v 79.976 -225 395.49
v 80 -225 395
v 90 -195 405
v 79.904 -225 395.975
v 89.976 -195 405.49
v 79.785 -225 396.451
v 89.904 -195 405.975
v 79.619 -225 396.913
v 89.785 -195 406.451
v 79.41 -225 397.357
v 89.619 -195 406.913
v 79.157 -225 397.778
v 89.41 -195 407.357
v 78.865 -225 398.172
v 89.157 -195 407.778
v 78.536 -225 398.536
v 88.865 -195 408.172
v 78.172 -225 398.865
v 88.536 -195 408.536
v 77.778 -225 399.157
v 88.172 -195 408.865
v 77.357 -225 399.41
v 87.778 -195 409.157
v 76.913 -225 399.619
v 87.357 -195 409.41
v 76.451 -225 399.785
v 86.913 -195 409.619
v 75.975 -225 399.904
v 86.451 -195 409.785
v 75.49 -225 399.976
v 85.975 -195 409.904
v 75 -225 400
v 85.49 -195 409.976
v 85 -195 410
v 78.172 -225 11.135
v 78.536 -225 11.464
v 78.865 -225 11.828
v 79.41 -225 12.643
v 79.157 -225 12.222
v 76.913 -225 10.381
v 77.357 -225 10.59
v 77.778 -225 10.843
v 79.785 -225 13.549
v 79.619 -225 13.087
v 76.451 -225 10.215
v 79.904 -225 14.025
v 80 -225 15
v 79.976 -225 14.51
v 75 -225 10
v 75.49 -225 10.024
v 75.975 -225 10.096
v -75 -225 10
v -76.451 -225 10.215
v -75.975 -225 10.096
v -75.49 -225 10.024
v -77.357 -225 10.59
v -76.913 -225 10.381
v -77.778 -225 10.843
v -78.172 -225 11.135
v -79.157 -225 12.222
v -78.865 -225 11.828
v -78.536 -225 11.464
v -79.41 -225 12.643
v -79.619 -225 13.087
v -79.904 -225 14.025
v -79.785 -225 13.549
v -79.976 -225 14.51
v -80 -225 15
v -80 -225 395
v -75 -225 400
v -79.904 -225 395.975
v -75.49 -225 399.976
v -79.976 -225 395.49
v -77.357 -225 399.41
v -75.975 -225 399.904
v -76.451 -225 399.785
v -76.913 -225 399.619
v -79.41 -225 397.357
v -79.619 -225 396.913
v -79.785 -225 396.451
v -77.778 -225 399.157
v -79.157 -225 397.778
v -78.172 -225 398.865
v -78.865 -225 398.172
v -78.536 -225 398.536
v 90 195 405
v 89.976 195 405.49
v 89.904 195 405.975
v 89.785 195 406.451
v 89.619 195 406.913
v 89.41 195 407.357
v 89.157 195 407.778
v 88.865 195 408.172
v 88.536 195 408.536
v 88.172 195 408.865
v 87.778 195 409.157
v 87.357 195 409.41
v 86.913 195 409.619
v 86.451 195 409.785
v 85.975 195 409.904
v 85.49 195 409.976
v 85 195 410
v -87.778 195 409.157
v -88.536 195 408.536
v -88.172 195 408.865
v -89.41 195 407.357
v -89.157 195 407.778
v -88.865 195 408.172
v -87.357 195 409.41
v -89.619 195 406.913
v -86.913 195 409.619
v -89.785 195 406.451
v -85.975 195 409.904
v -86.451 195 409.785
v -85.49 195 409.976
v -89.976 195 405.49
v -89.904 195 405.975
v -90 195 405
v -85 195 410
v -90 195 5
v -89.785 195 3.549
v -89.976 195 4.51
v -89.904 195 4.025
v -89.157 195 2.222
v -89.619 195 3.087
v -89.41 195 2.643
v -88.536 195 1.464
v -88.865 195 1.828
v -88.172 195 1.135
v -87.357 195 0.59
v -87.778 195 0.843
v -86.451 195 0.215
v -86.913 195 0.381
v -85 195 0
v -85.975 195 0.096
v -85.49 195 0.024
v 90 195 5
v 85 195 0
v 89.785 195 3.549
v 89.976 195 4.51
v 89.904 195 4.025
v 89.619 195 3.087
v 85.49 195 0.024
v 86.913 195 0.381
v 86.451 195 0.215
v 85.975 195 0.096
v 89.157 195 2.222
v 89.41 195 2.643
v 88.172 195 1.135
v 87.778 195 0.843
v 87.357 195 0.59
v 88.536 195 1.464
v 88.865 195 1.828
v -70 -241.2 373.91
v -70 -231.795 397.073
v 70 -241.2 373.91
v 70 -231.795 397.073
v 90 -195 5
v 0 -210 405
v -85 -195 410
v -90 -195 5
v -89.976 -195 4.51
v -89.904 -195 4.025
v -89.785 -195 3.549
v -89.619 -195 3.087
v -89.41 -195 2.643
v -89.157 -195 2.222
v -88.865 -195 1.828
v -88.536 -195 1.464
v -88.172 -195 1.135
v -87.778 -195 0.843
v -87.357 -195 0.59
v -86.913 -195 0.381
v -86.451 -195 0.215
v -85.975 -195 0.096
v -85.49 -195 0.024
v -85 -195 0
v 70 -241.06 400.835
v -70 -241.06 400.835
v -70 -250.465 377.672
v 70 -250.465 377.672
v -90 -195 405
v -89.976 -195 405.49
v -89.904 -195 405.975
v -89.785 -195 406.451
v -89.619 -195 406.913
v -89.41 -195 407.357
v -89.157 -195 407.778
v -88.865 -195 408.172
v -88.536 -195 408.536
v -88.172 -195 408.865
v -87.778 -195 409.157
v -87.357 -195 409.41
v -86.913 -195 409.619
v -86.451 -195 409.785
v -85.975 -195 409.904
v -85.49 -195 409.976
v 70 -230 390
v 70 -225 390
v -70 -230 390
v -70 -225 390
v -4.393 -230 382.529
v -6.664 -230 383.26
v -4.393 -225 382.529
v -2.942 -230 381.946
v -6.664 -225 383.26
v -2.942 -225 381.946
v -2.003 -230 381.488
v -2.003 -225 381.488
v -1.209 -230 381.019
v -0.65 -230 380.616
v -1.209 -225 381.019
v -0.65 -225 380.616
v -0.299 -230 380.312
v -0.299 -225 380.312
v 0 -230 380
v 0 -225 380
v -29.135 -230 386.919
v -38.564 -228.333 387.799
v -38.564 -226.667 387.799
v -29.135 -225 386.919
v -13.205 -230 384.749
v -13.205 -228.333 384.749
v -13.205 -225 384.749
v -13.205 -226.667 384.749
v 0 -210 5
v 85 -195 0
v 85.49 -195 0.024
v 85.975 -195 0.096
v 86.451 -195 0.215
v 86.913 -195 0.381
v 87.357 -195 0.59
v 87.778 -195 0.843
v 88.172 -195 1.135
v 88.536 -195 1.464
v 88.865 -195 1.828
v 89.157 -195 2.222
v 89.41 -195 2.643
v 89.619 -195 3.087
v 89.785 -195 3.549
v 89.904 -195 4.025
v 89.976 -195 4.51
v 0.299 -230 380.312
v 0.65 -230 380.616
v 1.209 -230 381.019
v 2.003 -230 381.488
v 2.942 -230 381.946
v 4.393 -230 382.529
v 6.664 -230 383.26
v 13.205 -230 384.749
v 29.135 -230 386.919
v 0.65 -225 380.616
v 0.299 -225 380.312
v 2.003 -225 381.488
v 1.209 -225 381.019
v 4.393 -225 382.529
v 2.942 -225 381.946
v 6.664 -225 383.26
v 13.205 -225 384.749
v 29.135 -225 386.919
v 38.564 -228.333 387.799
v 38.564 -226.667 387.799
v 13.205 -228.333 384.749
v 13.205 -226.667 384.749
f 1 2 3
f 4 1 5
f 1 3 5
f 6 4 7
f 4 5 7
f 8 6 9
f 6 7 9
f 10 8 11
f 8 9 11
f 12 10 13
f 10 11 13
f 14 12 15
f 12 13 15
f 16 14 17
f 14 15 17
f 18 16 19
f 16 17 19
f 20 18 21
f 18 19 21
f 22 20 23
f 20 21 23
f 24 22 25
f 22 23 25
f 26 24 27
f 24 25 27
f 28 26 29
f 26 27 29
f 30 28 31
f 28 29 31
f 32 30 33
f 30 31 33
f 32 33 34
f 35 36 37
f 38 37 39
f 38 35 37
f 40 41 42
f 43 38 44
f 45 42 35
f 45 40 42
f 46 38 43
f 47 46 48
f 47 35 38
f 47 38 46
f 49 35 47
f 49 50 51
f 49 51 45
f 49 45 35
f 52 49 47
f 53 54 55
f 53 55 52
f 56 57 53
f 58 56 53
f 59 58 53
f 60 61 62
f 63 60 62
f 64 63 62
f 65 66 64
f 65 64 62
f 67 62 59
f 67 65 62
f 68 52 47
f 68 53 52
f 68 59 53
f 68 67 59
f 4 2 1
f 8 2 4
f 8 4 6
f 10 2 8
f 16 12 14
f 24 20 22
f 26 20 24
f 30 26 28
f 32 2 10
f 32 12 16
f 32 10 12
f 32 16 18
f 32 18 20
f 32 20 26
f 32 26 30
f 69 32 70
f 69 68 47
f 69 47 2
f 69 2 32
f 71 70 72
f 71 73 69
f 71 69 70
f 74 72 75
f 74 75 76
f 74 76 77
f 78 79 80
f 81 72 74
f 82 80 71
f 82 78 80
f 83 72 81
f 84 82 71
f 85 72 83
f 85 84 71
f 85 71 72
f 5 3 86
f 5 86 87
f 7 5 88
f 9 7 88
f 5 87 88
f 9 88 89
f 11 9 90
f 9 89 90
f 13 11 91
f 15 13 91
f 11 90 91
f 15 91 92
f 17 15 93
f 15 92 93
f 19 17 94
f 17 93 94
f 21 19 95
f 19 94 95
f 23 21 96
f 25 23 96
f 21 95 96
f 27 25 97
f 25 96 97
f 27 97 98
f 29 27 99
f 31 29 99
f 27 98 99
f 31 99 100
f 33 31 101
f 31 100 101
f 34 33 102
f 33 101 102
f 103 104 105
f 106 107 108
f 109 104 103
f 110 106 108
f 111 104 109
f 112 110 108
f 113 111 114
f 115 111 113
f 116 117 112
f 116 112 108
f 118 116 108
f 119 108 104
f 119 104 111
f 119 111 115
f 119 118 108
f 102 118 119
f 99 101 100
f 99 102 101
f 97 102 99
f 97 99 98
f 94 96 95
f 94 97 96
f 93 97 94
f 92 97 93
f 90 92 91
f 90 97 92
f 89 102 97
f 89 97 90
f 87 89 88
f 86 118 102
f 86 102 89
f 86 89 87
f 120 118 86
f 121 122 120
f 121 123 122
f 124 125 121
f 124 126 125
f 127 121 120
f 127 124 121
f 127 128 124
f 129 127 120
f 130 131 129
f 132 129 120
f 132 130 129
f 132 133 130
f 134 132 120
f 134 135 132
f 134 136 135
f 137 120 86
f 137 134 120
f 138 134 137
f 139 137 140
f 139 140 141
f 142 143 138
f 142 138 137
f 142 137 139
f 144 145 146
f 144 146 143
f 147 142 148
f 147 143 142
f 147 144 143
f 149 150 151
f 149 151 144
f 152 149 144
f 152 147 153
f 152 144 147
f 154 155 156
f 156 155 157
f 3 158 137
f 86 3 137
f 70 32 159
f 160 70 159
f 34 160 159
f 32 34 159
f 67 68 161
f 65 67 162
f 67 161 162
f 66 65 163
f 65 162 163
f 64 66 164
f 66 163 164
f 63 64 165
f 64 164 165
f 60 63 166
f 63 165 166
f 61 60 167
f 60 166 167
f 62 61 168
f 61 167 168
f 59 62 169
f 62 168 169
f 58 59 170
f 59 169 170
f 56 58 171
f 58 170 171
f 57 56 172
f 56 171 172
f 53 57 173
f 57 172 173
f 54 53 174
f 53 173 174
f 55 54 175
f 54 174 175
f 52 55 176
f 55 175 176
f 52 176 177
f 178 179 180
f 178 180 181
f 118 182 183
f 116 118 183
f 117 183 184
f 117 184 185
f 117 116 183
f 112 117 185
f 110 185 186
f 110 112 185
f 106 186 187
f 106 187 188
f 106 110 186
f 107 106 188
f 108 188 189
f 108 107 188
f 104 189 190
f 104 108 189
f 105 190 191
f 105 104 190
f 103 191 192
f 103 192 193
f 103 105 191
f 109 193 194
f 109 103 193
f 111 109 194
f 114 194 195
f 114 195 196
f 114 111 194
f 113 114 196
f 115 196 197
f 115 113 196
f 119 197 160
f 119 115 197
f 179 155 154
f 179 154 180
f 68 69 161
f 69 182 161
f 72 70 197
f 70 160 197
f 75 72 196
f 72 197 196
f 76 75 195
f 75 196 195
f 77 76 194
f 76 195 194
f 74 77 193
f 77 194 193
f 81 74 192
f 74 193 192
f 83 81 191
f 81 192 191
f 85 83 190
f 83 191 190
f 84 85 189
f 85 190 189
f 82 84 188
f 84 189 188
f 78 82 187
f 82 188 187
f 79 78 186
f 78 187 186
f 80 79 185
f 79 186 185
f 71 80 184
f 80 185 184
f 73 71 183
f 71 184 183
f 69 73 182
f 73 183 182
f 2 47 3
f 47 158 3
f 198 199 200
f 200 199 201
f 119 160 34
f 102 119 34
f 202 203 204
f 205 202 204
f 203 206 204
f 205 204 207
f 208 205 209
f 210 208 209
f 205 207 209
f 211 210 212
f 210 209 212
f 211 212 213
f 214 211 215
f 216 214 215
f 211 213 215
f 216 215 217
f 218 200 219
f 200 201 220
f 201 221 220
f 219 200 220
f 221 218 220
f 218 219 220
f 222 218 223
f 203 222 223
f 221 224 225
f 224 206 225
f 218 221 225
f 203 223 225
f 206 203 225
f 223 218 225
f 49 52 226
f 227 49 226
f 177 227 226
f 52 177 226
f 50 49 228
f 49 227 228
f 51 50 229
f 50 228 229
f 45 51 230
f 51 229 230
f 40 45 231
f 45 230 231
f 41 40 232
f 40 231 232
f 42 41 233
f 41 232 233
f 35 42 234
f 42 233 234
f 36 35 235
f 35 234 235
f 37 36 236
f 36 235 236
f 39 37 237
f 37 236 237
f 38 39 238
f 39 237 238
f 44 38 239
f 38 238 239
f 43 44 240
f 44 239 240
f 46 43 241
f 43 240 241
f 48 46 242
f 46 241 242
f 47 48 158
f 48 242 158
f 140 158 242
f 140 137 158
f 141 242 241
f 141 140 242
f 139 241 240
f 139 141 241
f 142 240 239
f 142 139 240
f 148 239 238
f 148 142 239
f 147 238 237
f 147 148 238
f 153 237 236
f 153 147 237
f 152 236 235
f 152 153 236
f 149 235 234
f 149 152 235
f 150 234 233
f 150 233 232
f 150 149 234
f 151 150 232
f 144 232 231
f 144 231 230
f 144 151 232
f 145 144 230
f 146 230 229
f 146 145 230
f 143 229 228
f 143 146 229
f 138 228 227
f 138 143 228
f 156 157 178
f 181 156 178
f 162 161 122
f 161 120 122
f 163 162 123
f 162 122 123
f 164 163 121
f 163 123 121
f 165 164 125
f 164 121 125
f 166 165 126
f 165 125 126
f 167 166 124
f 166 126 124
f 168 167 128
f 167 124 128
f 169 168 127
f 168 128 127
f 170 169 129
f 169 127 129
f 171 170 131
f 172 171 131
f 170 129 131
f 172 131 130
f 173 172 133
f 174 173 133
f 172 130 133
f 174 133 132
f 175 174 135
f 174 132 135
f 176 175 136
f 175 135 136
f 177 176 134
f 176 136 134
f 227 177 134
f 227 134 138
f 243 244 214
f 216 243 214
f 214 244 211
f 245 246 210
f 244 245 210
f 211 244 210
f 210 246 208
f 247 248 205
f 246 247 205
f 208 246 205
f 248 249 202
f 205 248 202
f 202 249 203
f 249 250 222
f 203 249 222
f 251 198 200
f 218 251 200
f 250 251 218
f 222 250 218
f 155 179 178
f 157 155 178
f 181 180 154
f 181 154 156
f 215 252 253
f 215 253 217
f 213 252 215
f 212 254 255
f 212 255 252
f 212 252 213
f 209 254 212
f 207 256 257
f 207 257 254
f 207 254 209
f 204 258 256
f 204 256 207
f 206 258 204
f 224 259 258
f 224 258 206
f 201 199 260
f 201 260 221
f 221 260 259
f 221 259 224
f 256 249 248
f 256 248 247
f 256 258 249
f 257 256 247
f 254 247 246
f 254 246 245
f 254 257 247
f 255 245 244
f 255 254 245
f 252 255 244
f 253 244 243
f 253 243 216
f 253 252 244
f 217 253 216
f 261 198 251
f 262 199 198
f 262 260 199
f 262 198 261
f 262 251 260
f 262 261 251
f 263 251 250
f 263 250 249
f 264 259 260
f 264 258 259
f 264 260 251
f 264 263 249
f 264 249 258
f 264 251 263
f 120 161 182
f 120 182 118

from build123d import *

# Parameters (mm, degrees)
F0_W      = 180
F0_H      = 390
F1_DEPTH  = 410
F2_R      = 5
F8_DEPTH  = 5
F7_W      = 140
F7_H      = 10
F9_DEPTH  = 25
F10_ANGLE = 67.9004960609


with BuildPart() as f1:
    # F0 (on Top) → F1 (new body)
    with BuildSketch(Plane.XY):
        Rectangle(F0_W, F0_H)
    extrude(amount=F1_DEPTH)

    # F2
    f2_edges = [f1.edges().sort_by_distance(p)[0] for p in [
        (90, 0, 410),
        (-90, 0, 410),
        (90, 0, 0),
        (-90, 0, 0),
    ]]
    fillet(f2_edges, radius=F2_R)

    # F4 (on offset) → F6 section 0
    with BuildSketch(Plane.XZ.offset(225)):
        with BuildLine():
            Line((75, 400), (-75, 400))
            ThreePointArc((-75, 400), (-78.5355339059, 398.5355339059), (-80, 395))
            Line((-80, 395), (-80, 15))
            ThreePointArc((-80, 15), (-78.5355339059, 11.4644660941), (-75, 10))
            Line((-75, 10), (75, 10))
            ThreePointArc((75, 10), (78.5355339059, 11.4644660941), (80, 15))
            Line((80, 15), (80, 395))
            ThreePointArc((80, 395), (78.5355339059, 398.5355339059), (75, 400))
        make_face()
    # F5 (on face) → F6 section 1
    with BuildSketch(Plane.XZ.offset(195)):
        with BuildLine():
            Line((85, 410), (-85, 410))
            ThreePointArc((-85, 410), (-88.5355339059, 408.5355339059), (-90, 405))
            Line((-90, 405), (-90, 5))
            ThreePointArc((-90, 5), (-88.5355339059, 1.4644660941), (-85, 0))
            Line((-85, 0), (85, 0))
            ThreePointArc((85, 0), (88.5355339059, 1.4644660941), (90, 5))
            Line((90, 5), (90, 405))
            ThreePointArc((90, 405), (88.5355339059, 408.5355339059), (85, 410))
        make_face()
    loft()


with BuildPart() as f8:
    # F7 (on face) → F8 (new body)
    with BuildSketch(Plane.XZ.offset(225)):
        with BuildLine():
            add(Edge.make_bspline(
                [(70, 390), (37.5507314975, 387.9410181266), (5.1014629951, 385.8820362533), (0, 380)],
                knots=[0, 0, 0, 0, 0.7813658716, 0.7813658716, 0.7813658716, 0.7813658716], degree=3))
            Line((70, 390), (0, 390))
            Line((0, 390), (0, 380))
        make_face()
        with BuildLine():
            Line((0, 380), (0, 390))
            Line((0, 390), (-70, 390))
            add(Edge.make_bspline(
                [(-70, 390), (-37.5507314975, 387.9410181266), (-5.1014629951, 385.8820362533), (0, 380)],
                knots=[0, 0, 0, 0, 0.7813658716, 0.7813658716, 0.7813658716, 0.7813658716], degree=3))
        make_face()
    extrude(amount=F8_DEPTH)


with BuildPart() as f9:
    # F7 (on face) → F9 (new body)
    with BuildSketch(Plane.XZ.offset(225)):
        with Locations((0, 342.2095525265)):
            Rectangle(F7_W, F7_H)
    extrude(amount=F9_DEPTH)


with BuildPart() as f9_1:
    # F10: moved
    add(f9.part.rotate(Axis((0, -250, 337.2095525265), (1, 0, 0)), F10_ANGLE))


with BuildPart() as f9_2:
    # F11: moved
    add(f9_1.part.moved(Location((0, 8.8, 36.7))))


solid = Compound([f1.part, f8.part, f9_2.part])
